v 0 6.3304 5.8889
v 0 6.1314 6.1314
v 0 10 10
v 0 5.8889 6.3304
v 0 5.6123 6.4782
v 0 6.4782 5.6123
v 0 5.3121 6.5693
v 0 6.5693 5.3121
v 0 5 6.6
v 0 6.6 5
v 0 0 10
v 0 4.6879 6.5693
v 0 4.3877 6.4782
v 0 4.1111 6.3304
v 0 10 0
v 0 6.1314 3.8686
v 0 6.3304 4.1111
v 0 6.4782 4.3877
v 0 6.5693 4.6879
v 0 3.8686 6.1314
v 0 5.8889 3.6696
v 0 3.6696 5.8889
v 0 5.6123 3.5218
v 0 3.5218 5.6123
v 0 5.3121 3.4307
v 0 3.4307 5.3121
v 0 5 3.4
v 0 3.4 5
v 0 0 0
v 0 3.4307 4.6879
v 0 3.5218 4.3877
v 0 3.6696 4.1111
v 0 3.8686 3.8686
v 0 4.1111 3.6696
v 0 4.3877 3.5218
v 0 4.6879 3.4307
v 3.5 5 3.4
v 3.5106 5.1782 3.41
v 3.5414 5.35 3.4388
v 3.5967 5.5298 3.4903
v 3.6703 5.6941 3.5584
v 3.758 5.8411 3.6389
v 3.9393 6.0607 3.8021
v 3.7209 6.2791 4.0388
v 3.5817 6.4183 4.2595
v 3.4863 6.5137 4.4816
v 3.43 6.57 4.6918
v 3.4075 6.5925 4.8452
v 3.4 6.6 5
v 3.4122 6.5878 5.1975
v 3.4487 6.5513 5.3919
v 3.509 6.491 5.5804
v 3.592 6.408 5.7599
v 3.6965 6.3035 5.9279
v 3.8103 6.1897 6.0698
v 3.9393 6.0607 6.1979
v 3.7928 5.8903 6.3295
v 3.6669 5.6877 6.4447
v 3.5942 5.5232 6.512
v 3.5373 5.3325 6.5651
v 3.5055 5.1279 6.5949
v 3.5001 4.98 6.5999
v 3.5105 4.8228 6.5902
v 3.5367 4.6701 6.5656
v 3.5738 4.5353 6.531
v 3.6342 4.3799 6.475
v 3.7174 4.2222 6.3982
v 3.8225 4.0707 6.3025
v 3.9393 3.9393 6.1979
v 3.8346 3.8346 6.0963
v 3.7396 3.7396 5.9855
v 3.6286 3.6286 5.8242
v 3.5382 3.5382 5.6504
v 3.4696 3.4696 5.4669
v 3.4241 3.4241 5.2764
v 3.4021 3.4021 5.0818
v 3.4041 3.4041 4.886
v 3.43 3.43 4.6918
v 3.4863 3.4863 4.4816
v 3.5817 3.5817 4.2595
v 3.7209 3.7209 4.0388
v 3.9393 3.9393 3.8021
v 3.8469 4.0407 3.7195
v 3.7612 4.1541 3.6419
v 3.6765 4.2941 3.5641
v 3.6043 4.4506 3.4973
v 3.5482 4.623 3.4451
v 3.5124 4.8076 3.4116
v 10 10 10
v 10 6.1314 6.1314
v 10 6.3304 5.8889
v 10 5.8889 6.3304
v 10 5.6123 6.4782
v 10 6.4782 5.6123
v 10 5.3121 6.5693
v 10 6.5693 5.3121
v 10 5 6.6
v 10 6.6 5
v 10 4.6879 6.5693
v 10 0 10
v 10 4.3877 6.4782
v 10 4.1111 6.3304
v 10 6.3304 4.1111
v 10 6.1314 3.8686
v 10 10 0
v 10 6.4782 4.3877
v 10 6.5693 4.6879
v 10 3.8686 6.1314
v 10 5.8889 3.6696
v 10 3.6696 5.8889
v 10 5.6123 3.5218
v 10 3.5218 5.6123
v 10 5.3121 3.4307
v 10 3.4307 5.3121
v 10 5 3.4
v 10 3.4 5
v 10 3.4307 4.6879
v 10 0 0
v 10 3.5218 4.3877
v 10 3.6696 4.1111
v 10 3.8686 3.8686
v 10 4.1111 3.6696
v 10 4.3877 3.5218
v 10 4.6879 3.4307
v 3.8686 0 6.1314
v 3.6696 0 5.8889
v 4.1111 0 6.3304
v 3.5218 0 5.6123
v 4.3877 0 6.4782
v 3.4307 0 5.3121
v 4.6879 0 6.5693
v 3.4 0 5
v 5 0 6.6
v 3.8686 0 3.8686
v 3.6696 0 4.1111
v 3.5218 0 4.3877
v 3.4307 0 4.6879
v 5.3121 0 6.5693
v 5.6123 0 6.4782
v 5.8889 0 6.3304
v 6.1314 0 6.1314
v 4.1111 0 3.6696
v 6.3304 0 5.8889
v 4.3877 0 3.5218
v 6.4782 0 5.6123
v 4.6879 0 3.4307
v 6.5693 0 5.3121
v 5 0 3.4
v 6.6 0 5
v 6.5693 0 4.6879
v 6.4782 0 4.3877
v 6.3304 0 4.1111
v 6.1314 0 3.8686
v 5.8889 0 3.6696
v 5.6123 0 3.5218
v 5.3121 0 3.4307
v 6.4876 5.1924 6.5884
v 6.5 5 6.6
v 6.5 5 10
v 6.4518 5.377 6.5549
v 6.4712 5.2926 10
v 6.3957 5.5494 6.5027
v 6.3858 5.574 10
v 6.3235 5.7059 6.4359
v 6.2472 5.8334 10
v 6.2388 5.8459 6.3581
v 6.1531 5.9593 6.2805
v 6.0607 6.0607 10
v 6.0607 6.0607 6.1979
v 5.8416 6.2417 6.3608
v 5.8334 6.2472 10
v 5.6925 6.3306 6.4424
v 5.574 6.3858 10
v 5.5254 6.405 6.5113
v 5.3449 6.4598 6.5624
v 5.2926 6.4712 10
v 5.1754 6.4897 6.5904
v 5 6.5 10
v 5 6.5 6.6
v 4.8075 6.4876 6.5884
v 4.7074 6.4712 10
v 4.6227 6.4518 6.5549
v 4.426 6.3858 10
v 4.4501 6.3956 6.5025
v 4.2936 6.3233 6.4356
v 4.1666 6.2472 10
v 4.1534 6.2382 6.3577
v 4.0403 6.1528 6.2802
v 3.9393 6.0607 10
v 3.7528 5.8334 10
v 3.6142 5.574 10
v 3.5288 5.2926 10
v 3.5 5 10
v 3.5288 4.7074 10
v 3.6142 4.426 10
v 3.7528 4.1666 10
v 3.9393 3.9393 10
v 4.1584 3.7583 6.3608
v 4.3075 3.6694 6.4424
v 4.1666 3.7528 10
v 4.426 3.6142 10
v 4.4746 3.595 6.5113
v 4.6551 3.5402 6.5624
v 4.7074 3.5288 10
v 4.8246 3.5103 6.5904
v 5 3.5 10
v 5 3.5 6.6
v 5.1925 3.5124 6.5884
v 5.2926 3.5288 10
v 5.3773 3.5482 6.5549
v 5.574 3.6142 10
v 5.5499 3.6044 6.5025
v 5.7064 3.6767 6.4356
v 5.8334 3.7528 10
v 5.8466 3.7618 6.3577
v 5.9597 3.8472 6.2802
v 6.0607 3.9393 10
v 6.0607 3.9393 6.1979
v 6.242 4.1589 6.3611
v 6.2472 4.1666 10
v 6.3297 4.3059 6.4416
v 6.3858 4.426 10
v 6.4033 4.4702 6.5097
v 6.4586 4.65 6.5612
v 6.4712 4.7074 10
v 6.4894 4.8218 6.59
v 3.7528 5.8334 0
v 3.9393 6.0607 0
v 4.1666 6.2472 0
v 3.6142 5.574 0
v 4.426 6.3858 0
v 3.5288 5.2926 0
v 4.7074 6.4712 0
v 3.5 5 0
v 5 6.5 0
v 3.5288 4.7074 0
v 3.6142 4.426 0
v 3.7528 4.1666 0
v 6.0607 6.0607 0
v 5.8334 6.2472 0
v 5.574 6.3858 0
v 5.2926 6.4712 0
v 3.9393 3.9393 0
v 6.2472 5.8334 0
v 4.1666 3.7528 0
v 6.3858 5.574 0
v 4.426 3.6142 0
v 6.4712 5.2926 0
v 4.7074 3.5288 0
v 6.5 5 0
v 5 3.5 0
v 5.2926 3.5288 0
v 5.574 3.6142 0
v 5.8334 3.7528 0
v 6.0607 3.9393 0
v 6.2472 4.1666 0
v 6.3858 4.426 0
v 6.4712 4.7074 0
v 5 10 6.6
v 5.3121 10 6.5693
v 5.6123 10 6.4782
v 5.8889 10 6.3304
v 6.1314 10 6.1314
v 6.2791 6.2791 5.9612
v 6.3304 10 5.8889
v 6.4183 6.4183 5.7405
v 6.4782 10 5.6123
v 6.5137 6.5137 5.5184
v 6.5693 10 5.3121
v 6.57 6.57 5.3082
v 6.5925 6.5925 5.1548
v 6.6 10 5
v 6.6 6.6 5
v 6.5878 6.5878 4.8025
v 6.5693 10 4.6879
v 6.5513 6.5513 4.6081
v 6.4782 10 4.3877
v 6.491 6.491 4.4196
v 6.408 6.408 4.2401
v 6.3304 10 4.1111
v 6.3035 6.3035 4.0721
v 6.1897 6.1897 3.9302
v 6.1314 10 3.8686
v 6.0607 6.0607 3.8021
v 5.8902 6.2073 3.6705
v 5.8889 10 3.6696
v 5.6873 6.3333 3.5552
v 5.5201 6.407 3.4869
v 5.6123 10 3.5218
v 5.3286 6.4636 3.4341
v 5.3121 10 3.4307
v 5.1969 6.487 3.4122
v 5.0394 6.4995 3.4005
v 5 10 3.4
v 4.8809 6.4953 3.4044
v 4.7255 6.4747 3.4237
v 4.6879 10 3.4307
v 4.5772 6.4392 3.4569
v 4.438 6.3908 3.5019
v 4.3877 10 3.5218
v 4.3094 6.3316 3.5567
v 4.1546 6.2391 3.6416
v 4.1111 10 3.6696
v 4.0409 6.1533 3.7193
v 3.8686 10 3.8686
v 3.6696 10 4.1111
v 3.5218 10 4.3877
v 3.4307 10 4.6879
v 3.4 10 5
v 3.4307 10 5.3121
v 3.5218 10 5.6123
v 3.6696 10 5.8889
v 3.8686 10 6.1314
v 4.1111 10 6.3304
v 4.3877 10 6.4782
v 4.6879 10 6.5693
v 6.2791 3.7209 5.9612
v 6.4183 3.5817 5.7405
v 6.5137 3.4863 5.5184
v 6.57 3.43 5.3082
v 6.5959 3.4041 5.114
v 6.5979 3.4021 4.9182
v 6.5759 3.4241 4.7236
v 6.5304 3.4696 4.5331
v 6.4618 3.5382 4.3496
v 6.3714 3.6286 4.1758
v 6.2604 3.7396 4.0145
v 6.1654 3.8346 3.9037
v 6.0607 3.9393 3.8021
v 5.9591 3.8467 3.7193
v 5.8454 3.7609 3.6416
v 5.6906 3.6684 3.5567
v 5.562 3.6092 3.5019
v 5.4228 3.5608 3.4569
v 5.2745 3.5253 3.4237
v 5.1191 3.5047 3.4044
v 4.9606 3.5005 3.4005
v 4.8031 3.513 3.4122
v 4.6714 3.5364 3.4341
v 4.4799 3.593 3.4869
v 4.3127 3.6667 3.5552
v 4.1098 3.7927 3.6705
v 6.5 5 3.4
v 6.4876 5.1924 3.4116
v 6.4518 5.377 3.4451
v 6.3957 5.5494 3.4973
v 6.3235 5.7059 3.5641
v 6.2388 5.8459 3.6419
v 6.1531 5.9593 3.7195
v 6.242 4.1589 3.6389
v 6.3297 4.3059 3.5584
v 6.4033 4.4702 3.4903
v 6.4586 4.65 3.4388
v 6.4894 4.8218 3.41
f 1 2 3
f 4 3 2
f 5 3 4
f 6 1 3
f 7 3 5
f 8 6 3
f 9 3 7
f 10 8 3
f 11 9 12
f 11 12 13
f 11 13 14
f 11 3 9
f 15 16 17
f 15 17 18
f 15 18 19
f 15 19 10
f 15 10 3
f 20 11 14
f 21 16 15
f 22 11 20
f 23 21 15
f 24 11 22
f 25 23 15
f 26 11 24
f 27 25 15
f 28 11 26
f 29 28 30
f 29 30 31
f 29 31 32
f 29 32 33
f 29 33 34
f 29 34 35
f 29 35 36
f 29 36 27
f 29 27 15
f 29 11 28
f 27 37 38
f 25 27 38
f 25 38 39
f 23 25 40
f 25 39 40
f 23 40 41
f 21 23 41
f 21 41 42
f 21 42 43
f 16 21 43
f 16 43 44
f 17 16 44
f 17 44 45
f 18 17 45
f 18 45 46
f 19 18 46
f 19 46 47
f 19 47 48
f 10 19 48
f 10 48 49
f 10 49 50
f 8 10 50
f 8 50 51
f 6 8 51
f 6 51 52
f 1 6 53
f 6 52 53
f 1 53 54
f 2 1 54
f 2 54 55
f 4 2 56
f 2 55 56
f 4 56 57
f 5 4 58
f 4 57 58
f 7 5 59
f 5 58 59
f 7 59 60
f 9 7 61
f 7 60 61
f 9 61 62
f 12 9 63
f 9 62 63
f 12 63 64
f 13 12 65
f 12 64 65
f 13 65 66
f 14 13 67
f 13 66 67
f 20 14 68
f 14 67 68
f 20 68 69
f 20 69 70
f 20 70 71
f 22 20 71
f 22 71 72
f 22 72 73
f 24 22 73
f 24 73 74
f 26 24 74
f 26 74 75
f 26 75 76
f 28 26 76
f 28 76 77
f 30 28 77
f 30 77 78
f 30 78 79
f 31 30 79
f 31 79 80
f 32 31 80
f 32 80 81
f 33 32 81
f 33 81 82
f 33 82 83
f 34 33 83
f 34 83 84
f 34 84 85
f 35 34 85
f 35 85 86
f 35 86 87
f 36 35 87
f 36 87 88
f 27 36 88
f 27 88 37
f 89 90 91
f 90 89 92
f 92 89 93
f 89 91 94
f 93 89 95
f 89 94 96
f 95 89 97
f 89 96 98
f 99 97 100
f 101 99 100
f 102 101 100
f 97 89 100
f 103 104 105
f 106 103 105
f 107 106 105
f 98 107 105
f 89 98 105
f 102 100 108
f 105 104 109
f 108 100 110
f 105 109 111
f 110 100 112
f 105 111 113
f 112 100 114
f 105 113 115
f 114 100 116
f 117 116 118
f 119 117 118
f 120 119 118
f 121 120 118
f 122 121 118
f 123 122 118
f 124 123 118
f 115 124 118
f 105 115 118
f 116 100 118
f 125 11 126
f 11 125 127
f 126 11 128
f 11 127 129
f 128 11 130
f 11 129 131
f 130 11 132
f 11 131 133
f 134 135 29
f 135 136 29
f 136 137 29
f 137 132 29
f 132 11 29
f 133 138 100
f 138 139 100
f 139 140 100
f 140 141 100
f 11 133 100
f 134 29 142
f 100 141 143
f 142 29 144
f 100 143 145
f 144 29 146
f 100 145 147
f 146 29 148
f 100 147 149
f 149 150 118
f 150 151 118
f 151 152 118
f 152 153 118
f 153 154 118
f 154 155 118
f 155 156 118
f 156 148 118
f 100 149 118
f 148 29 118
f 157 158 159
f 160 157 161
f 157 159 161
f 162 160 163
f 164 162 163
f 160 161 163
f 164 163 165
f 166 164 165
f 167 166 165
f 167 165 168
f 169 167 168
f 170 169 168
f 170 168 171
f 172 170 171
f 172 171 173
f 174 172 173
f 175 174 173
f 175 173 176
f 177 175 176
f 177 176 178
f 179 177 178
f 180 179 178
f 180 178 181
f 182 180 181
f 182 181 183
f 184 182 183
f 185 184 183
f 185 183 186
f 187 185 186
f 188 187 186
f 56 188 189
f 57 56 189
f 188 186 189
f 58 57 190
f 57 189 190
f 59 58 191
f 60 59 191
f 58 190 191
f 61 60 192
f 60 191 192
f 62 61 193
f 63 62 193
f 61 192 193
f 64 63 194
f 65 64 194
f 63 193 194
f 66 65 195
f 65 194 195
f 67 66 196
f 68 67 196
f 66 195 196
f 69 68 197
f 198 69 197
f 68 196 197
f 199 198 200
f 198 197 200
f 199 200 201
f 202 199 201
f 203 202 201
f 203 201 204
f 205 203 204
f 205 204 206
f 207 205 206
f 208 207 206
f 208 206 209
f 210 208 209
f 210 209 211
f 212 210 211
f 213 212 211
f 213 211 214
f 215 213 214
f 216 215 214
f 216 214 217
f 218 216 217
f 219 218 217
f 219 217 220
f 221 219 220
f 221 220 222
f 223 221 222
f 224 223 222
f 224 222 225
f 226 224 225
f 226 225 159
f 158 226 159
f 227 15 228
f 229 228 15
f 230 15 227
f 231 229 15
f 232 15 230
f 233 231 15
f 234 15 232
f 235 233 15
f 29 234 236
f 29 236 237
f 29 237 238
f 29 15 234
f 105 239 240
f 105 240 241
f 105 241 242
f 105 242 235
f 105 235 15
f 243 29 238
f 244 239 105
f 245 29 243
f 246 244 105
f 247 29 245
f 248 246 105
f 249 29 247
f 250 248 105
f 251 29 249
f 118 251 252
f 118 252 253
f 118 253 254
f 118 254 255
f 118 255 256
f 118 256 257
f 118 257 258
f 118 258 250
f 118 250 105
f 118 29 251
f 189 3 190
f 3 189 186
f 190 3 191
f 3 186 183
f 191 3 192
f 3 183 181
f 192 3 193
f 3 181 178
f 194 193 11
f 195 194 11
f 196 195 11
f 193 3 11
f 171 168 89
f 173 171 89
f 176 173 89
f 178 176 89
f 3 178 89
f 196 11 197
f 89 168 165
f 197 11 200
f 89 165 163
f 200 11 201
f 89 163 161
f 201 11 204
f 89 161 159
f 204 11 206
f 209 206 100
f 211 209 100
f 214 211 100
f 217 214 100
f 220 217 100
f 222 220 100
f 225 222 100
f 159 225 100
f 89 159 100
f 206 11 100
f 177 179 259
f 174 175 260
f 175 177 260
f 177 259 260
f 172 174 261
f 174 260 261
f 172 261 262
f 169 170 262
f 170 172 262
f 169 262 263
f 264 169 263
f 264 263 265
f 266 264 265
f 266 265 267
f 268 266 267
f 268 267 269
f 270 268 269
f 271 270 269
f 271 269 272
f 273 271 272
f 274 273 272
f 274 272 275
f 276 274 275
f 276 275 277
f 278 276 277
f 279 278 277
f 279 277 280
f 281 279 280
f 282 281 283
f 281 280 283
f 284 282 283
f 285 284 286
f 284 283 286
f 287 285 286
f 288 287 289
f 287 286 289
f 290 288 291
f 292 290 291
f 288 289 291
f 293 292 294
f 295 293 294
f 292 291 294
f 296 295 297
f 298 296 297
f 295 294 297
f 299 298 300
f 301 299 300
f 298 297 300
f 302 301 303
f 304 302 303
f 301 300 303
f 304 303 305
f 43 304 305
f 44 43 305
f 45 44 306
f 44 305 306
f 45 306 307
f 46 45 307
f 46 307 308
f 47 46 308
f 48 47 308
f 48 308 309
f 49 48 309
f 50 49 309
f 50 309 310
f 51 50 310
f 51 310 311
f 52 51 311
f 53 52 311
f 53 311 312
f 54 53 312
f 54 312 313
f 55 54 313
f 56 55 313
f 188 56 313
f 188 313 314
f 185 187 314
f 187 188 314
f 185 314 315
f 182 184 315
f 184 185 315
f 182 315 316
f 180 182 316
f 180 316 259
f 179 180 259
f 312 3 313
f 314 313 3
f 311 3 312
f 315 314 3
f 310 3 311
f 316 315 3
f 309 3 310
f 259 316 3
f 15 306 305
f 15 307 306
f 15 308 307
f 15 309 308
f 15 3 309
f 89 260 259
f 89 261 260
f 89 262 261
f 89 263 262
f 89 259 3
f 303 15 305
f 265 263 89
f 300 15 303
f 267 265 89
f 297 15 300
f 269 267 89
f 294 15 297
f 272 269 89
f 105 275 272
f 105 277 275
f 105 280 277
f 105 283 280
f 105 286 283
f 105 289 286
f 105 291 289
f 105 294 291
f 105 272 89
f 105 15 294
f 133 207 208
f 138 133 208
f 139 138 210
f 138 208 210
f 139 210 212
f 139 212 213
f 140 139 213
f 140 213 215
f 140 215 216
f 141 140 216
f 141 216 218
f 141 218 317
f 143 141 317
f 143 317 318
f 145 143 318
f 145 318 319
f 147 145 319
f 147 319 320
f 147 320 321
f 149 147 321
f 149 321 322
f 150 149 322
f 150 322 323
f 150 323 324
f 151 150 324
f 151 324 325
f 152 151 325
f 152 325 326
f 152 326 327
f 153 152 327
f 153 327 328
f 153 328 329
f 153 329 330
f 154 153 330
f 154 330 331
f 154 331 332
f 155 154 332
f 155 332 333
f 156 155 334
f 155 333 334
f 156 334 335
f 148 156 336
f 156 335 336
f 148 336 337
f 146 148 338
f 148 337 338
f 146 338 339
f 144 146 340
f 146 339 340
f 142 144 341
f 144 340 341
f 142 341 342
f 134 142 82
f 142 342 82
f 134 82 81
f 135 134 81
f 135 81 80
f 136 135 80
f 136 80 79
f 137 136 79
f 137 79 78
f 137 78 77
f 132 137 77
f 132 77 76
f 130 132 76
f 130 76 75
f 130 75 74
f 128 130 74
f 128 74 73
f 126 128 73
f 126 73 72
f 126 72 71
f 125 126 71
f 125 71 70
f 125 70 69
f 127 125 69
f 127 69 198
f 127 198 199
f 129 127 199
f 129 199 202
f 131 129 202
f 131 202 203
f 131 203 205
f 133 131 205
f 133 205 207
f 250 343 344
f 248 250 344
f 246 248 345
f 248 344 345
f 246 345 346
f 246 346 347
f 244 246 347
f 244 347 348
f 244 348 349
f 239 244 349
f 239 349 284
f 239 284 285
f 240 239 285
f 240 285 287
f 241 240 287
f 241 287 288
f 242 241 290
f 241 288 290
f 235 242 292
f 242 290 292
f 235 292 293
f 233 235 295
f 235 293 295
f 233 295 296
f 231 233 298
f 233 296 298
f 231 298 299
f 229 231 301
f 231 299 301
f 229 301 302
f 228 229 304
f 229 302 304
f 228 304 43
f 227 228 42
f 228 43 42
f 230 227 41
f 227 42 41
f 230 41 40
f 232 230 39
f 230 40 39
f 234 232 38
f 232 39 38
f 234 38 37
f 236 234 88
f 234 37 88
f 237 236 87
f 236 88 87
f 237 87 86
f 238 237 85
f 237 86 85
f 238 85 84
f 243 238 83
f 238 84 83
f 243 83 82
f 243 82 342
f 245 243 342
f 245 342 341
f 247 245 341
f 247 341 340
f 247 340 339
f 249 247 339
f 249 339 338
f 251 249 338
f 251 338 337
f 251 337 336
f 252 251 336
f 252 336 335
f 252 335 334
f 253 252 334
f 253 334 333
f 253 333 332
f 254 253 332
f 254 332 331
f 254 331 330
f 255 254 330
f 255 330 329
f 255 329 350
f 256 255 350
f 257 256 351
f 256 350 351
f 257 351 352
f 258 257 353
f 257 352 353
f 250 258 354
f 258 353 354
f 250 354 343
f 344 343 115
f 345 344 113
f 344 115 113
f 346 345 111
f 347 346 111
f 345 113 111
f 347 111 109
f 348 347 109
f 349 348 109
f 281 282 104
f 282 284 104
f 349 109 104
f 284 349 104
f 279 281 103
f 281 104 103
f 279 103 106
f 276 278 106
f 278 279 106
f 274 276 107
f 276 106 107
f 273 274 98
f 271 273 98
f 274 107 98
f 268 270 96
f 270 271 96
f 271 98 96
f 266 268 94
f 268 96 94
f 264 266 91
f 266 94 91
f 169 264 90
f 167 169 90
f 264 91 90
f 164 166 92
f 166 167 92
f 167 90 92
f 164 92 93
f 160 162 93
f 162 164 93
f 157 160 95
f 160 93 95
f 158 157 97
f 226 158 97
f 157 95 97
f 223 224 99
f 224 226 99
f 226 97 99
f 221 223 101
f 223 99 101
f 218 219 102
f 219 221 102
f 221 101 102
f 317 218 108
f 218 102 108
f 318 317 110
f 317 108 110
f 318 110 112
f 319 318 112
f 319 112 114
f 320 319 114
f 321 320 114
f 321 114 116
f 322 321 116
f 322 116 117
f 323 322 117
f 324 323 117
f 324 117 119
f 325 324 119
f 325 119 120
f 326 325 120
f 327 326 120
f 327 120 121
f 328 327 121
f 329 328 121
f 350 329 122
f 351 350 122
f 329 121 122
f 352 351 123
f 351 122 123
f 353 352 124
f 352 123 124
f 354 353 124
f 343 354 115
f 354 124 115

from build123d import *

# Parameters (mm, degrees)
SKETCH_1_W          = 10
SKETCH_1_H          = 10
EXTRUDE_1_DEPTH     = 10
SKETCH_2_R          = 1.5
CUT_EXTRUDE_1_DEPTH = 10
SKETCH_3_R          = 1.6
CUT_EXTRUDE_2_DEPTH = 10
SKETCH_4_R          = 1.6
CUT_EXTRUDE_3_DEPTH = 10


with BuildPart() as part:
    # 草图1 → 凸台-拉伸1 (new body)
    with BuildSketch(Plane(origin=(0, 0, 0), x_dir=(1, 0, 0), z_dir=(0, 1, 0))):
        with Locations((5, -5)):
            Rectangle(SKETCH_1_W, SKETCH_1_H)
    extrude(amount=EXTRUDE_1_DEPTH)

    # 草图2 → 切除-拉伸1 (cut)
    with BuildSketch(Plane.XY.offset(10)):
        with Locations((5, 5)):
            Circle(SKETCH_2_R)
    extrude(amount=-CUT_EXTRUDE_1_DEPTH, mode=Mode.SUBTRACT)

    # 草图3 → 切除-拉伸2 (cut)
    with BuildSketch(Plane(origin=(0, 10, 0), x_dir=(1, 0, 0), z_dir=(0, 1, 0))):
        with Locations(Location((5, -5, 0), (0, 0, 270))):
            Circle(SKETCH_3_R)
    extrude(amount=-CUT_EXTRUDE_2_DEPTH, mode=Mode.SUBTRACT)

    # 草图4 → 切除-拉伸3 (cut)
    with BuildSketch(Plane(origin=(10, 0, 0), x_dir=(0, 0, -1), z_dir=(1, 0, 0))):
        with Locations((-5, 5)):
            Circle(SKETCH_4_R)
    extrude(amount=-CUT_EXTRUDE_3_DEPTH, mode=Mode.SUBTRACT)


solid = part.part
